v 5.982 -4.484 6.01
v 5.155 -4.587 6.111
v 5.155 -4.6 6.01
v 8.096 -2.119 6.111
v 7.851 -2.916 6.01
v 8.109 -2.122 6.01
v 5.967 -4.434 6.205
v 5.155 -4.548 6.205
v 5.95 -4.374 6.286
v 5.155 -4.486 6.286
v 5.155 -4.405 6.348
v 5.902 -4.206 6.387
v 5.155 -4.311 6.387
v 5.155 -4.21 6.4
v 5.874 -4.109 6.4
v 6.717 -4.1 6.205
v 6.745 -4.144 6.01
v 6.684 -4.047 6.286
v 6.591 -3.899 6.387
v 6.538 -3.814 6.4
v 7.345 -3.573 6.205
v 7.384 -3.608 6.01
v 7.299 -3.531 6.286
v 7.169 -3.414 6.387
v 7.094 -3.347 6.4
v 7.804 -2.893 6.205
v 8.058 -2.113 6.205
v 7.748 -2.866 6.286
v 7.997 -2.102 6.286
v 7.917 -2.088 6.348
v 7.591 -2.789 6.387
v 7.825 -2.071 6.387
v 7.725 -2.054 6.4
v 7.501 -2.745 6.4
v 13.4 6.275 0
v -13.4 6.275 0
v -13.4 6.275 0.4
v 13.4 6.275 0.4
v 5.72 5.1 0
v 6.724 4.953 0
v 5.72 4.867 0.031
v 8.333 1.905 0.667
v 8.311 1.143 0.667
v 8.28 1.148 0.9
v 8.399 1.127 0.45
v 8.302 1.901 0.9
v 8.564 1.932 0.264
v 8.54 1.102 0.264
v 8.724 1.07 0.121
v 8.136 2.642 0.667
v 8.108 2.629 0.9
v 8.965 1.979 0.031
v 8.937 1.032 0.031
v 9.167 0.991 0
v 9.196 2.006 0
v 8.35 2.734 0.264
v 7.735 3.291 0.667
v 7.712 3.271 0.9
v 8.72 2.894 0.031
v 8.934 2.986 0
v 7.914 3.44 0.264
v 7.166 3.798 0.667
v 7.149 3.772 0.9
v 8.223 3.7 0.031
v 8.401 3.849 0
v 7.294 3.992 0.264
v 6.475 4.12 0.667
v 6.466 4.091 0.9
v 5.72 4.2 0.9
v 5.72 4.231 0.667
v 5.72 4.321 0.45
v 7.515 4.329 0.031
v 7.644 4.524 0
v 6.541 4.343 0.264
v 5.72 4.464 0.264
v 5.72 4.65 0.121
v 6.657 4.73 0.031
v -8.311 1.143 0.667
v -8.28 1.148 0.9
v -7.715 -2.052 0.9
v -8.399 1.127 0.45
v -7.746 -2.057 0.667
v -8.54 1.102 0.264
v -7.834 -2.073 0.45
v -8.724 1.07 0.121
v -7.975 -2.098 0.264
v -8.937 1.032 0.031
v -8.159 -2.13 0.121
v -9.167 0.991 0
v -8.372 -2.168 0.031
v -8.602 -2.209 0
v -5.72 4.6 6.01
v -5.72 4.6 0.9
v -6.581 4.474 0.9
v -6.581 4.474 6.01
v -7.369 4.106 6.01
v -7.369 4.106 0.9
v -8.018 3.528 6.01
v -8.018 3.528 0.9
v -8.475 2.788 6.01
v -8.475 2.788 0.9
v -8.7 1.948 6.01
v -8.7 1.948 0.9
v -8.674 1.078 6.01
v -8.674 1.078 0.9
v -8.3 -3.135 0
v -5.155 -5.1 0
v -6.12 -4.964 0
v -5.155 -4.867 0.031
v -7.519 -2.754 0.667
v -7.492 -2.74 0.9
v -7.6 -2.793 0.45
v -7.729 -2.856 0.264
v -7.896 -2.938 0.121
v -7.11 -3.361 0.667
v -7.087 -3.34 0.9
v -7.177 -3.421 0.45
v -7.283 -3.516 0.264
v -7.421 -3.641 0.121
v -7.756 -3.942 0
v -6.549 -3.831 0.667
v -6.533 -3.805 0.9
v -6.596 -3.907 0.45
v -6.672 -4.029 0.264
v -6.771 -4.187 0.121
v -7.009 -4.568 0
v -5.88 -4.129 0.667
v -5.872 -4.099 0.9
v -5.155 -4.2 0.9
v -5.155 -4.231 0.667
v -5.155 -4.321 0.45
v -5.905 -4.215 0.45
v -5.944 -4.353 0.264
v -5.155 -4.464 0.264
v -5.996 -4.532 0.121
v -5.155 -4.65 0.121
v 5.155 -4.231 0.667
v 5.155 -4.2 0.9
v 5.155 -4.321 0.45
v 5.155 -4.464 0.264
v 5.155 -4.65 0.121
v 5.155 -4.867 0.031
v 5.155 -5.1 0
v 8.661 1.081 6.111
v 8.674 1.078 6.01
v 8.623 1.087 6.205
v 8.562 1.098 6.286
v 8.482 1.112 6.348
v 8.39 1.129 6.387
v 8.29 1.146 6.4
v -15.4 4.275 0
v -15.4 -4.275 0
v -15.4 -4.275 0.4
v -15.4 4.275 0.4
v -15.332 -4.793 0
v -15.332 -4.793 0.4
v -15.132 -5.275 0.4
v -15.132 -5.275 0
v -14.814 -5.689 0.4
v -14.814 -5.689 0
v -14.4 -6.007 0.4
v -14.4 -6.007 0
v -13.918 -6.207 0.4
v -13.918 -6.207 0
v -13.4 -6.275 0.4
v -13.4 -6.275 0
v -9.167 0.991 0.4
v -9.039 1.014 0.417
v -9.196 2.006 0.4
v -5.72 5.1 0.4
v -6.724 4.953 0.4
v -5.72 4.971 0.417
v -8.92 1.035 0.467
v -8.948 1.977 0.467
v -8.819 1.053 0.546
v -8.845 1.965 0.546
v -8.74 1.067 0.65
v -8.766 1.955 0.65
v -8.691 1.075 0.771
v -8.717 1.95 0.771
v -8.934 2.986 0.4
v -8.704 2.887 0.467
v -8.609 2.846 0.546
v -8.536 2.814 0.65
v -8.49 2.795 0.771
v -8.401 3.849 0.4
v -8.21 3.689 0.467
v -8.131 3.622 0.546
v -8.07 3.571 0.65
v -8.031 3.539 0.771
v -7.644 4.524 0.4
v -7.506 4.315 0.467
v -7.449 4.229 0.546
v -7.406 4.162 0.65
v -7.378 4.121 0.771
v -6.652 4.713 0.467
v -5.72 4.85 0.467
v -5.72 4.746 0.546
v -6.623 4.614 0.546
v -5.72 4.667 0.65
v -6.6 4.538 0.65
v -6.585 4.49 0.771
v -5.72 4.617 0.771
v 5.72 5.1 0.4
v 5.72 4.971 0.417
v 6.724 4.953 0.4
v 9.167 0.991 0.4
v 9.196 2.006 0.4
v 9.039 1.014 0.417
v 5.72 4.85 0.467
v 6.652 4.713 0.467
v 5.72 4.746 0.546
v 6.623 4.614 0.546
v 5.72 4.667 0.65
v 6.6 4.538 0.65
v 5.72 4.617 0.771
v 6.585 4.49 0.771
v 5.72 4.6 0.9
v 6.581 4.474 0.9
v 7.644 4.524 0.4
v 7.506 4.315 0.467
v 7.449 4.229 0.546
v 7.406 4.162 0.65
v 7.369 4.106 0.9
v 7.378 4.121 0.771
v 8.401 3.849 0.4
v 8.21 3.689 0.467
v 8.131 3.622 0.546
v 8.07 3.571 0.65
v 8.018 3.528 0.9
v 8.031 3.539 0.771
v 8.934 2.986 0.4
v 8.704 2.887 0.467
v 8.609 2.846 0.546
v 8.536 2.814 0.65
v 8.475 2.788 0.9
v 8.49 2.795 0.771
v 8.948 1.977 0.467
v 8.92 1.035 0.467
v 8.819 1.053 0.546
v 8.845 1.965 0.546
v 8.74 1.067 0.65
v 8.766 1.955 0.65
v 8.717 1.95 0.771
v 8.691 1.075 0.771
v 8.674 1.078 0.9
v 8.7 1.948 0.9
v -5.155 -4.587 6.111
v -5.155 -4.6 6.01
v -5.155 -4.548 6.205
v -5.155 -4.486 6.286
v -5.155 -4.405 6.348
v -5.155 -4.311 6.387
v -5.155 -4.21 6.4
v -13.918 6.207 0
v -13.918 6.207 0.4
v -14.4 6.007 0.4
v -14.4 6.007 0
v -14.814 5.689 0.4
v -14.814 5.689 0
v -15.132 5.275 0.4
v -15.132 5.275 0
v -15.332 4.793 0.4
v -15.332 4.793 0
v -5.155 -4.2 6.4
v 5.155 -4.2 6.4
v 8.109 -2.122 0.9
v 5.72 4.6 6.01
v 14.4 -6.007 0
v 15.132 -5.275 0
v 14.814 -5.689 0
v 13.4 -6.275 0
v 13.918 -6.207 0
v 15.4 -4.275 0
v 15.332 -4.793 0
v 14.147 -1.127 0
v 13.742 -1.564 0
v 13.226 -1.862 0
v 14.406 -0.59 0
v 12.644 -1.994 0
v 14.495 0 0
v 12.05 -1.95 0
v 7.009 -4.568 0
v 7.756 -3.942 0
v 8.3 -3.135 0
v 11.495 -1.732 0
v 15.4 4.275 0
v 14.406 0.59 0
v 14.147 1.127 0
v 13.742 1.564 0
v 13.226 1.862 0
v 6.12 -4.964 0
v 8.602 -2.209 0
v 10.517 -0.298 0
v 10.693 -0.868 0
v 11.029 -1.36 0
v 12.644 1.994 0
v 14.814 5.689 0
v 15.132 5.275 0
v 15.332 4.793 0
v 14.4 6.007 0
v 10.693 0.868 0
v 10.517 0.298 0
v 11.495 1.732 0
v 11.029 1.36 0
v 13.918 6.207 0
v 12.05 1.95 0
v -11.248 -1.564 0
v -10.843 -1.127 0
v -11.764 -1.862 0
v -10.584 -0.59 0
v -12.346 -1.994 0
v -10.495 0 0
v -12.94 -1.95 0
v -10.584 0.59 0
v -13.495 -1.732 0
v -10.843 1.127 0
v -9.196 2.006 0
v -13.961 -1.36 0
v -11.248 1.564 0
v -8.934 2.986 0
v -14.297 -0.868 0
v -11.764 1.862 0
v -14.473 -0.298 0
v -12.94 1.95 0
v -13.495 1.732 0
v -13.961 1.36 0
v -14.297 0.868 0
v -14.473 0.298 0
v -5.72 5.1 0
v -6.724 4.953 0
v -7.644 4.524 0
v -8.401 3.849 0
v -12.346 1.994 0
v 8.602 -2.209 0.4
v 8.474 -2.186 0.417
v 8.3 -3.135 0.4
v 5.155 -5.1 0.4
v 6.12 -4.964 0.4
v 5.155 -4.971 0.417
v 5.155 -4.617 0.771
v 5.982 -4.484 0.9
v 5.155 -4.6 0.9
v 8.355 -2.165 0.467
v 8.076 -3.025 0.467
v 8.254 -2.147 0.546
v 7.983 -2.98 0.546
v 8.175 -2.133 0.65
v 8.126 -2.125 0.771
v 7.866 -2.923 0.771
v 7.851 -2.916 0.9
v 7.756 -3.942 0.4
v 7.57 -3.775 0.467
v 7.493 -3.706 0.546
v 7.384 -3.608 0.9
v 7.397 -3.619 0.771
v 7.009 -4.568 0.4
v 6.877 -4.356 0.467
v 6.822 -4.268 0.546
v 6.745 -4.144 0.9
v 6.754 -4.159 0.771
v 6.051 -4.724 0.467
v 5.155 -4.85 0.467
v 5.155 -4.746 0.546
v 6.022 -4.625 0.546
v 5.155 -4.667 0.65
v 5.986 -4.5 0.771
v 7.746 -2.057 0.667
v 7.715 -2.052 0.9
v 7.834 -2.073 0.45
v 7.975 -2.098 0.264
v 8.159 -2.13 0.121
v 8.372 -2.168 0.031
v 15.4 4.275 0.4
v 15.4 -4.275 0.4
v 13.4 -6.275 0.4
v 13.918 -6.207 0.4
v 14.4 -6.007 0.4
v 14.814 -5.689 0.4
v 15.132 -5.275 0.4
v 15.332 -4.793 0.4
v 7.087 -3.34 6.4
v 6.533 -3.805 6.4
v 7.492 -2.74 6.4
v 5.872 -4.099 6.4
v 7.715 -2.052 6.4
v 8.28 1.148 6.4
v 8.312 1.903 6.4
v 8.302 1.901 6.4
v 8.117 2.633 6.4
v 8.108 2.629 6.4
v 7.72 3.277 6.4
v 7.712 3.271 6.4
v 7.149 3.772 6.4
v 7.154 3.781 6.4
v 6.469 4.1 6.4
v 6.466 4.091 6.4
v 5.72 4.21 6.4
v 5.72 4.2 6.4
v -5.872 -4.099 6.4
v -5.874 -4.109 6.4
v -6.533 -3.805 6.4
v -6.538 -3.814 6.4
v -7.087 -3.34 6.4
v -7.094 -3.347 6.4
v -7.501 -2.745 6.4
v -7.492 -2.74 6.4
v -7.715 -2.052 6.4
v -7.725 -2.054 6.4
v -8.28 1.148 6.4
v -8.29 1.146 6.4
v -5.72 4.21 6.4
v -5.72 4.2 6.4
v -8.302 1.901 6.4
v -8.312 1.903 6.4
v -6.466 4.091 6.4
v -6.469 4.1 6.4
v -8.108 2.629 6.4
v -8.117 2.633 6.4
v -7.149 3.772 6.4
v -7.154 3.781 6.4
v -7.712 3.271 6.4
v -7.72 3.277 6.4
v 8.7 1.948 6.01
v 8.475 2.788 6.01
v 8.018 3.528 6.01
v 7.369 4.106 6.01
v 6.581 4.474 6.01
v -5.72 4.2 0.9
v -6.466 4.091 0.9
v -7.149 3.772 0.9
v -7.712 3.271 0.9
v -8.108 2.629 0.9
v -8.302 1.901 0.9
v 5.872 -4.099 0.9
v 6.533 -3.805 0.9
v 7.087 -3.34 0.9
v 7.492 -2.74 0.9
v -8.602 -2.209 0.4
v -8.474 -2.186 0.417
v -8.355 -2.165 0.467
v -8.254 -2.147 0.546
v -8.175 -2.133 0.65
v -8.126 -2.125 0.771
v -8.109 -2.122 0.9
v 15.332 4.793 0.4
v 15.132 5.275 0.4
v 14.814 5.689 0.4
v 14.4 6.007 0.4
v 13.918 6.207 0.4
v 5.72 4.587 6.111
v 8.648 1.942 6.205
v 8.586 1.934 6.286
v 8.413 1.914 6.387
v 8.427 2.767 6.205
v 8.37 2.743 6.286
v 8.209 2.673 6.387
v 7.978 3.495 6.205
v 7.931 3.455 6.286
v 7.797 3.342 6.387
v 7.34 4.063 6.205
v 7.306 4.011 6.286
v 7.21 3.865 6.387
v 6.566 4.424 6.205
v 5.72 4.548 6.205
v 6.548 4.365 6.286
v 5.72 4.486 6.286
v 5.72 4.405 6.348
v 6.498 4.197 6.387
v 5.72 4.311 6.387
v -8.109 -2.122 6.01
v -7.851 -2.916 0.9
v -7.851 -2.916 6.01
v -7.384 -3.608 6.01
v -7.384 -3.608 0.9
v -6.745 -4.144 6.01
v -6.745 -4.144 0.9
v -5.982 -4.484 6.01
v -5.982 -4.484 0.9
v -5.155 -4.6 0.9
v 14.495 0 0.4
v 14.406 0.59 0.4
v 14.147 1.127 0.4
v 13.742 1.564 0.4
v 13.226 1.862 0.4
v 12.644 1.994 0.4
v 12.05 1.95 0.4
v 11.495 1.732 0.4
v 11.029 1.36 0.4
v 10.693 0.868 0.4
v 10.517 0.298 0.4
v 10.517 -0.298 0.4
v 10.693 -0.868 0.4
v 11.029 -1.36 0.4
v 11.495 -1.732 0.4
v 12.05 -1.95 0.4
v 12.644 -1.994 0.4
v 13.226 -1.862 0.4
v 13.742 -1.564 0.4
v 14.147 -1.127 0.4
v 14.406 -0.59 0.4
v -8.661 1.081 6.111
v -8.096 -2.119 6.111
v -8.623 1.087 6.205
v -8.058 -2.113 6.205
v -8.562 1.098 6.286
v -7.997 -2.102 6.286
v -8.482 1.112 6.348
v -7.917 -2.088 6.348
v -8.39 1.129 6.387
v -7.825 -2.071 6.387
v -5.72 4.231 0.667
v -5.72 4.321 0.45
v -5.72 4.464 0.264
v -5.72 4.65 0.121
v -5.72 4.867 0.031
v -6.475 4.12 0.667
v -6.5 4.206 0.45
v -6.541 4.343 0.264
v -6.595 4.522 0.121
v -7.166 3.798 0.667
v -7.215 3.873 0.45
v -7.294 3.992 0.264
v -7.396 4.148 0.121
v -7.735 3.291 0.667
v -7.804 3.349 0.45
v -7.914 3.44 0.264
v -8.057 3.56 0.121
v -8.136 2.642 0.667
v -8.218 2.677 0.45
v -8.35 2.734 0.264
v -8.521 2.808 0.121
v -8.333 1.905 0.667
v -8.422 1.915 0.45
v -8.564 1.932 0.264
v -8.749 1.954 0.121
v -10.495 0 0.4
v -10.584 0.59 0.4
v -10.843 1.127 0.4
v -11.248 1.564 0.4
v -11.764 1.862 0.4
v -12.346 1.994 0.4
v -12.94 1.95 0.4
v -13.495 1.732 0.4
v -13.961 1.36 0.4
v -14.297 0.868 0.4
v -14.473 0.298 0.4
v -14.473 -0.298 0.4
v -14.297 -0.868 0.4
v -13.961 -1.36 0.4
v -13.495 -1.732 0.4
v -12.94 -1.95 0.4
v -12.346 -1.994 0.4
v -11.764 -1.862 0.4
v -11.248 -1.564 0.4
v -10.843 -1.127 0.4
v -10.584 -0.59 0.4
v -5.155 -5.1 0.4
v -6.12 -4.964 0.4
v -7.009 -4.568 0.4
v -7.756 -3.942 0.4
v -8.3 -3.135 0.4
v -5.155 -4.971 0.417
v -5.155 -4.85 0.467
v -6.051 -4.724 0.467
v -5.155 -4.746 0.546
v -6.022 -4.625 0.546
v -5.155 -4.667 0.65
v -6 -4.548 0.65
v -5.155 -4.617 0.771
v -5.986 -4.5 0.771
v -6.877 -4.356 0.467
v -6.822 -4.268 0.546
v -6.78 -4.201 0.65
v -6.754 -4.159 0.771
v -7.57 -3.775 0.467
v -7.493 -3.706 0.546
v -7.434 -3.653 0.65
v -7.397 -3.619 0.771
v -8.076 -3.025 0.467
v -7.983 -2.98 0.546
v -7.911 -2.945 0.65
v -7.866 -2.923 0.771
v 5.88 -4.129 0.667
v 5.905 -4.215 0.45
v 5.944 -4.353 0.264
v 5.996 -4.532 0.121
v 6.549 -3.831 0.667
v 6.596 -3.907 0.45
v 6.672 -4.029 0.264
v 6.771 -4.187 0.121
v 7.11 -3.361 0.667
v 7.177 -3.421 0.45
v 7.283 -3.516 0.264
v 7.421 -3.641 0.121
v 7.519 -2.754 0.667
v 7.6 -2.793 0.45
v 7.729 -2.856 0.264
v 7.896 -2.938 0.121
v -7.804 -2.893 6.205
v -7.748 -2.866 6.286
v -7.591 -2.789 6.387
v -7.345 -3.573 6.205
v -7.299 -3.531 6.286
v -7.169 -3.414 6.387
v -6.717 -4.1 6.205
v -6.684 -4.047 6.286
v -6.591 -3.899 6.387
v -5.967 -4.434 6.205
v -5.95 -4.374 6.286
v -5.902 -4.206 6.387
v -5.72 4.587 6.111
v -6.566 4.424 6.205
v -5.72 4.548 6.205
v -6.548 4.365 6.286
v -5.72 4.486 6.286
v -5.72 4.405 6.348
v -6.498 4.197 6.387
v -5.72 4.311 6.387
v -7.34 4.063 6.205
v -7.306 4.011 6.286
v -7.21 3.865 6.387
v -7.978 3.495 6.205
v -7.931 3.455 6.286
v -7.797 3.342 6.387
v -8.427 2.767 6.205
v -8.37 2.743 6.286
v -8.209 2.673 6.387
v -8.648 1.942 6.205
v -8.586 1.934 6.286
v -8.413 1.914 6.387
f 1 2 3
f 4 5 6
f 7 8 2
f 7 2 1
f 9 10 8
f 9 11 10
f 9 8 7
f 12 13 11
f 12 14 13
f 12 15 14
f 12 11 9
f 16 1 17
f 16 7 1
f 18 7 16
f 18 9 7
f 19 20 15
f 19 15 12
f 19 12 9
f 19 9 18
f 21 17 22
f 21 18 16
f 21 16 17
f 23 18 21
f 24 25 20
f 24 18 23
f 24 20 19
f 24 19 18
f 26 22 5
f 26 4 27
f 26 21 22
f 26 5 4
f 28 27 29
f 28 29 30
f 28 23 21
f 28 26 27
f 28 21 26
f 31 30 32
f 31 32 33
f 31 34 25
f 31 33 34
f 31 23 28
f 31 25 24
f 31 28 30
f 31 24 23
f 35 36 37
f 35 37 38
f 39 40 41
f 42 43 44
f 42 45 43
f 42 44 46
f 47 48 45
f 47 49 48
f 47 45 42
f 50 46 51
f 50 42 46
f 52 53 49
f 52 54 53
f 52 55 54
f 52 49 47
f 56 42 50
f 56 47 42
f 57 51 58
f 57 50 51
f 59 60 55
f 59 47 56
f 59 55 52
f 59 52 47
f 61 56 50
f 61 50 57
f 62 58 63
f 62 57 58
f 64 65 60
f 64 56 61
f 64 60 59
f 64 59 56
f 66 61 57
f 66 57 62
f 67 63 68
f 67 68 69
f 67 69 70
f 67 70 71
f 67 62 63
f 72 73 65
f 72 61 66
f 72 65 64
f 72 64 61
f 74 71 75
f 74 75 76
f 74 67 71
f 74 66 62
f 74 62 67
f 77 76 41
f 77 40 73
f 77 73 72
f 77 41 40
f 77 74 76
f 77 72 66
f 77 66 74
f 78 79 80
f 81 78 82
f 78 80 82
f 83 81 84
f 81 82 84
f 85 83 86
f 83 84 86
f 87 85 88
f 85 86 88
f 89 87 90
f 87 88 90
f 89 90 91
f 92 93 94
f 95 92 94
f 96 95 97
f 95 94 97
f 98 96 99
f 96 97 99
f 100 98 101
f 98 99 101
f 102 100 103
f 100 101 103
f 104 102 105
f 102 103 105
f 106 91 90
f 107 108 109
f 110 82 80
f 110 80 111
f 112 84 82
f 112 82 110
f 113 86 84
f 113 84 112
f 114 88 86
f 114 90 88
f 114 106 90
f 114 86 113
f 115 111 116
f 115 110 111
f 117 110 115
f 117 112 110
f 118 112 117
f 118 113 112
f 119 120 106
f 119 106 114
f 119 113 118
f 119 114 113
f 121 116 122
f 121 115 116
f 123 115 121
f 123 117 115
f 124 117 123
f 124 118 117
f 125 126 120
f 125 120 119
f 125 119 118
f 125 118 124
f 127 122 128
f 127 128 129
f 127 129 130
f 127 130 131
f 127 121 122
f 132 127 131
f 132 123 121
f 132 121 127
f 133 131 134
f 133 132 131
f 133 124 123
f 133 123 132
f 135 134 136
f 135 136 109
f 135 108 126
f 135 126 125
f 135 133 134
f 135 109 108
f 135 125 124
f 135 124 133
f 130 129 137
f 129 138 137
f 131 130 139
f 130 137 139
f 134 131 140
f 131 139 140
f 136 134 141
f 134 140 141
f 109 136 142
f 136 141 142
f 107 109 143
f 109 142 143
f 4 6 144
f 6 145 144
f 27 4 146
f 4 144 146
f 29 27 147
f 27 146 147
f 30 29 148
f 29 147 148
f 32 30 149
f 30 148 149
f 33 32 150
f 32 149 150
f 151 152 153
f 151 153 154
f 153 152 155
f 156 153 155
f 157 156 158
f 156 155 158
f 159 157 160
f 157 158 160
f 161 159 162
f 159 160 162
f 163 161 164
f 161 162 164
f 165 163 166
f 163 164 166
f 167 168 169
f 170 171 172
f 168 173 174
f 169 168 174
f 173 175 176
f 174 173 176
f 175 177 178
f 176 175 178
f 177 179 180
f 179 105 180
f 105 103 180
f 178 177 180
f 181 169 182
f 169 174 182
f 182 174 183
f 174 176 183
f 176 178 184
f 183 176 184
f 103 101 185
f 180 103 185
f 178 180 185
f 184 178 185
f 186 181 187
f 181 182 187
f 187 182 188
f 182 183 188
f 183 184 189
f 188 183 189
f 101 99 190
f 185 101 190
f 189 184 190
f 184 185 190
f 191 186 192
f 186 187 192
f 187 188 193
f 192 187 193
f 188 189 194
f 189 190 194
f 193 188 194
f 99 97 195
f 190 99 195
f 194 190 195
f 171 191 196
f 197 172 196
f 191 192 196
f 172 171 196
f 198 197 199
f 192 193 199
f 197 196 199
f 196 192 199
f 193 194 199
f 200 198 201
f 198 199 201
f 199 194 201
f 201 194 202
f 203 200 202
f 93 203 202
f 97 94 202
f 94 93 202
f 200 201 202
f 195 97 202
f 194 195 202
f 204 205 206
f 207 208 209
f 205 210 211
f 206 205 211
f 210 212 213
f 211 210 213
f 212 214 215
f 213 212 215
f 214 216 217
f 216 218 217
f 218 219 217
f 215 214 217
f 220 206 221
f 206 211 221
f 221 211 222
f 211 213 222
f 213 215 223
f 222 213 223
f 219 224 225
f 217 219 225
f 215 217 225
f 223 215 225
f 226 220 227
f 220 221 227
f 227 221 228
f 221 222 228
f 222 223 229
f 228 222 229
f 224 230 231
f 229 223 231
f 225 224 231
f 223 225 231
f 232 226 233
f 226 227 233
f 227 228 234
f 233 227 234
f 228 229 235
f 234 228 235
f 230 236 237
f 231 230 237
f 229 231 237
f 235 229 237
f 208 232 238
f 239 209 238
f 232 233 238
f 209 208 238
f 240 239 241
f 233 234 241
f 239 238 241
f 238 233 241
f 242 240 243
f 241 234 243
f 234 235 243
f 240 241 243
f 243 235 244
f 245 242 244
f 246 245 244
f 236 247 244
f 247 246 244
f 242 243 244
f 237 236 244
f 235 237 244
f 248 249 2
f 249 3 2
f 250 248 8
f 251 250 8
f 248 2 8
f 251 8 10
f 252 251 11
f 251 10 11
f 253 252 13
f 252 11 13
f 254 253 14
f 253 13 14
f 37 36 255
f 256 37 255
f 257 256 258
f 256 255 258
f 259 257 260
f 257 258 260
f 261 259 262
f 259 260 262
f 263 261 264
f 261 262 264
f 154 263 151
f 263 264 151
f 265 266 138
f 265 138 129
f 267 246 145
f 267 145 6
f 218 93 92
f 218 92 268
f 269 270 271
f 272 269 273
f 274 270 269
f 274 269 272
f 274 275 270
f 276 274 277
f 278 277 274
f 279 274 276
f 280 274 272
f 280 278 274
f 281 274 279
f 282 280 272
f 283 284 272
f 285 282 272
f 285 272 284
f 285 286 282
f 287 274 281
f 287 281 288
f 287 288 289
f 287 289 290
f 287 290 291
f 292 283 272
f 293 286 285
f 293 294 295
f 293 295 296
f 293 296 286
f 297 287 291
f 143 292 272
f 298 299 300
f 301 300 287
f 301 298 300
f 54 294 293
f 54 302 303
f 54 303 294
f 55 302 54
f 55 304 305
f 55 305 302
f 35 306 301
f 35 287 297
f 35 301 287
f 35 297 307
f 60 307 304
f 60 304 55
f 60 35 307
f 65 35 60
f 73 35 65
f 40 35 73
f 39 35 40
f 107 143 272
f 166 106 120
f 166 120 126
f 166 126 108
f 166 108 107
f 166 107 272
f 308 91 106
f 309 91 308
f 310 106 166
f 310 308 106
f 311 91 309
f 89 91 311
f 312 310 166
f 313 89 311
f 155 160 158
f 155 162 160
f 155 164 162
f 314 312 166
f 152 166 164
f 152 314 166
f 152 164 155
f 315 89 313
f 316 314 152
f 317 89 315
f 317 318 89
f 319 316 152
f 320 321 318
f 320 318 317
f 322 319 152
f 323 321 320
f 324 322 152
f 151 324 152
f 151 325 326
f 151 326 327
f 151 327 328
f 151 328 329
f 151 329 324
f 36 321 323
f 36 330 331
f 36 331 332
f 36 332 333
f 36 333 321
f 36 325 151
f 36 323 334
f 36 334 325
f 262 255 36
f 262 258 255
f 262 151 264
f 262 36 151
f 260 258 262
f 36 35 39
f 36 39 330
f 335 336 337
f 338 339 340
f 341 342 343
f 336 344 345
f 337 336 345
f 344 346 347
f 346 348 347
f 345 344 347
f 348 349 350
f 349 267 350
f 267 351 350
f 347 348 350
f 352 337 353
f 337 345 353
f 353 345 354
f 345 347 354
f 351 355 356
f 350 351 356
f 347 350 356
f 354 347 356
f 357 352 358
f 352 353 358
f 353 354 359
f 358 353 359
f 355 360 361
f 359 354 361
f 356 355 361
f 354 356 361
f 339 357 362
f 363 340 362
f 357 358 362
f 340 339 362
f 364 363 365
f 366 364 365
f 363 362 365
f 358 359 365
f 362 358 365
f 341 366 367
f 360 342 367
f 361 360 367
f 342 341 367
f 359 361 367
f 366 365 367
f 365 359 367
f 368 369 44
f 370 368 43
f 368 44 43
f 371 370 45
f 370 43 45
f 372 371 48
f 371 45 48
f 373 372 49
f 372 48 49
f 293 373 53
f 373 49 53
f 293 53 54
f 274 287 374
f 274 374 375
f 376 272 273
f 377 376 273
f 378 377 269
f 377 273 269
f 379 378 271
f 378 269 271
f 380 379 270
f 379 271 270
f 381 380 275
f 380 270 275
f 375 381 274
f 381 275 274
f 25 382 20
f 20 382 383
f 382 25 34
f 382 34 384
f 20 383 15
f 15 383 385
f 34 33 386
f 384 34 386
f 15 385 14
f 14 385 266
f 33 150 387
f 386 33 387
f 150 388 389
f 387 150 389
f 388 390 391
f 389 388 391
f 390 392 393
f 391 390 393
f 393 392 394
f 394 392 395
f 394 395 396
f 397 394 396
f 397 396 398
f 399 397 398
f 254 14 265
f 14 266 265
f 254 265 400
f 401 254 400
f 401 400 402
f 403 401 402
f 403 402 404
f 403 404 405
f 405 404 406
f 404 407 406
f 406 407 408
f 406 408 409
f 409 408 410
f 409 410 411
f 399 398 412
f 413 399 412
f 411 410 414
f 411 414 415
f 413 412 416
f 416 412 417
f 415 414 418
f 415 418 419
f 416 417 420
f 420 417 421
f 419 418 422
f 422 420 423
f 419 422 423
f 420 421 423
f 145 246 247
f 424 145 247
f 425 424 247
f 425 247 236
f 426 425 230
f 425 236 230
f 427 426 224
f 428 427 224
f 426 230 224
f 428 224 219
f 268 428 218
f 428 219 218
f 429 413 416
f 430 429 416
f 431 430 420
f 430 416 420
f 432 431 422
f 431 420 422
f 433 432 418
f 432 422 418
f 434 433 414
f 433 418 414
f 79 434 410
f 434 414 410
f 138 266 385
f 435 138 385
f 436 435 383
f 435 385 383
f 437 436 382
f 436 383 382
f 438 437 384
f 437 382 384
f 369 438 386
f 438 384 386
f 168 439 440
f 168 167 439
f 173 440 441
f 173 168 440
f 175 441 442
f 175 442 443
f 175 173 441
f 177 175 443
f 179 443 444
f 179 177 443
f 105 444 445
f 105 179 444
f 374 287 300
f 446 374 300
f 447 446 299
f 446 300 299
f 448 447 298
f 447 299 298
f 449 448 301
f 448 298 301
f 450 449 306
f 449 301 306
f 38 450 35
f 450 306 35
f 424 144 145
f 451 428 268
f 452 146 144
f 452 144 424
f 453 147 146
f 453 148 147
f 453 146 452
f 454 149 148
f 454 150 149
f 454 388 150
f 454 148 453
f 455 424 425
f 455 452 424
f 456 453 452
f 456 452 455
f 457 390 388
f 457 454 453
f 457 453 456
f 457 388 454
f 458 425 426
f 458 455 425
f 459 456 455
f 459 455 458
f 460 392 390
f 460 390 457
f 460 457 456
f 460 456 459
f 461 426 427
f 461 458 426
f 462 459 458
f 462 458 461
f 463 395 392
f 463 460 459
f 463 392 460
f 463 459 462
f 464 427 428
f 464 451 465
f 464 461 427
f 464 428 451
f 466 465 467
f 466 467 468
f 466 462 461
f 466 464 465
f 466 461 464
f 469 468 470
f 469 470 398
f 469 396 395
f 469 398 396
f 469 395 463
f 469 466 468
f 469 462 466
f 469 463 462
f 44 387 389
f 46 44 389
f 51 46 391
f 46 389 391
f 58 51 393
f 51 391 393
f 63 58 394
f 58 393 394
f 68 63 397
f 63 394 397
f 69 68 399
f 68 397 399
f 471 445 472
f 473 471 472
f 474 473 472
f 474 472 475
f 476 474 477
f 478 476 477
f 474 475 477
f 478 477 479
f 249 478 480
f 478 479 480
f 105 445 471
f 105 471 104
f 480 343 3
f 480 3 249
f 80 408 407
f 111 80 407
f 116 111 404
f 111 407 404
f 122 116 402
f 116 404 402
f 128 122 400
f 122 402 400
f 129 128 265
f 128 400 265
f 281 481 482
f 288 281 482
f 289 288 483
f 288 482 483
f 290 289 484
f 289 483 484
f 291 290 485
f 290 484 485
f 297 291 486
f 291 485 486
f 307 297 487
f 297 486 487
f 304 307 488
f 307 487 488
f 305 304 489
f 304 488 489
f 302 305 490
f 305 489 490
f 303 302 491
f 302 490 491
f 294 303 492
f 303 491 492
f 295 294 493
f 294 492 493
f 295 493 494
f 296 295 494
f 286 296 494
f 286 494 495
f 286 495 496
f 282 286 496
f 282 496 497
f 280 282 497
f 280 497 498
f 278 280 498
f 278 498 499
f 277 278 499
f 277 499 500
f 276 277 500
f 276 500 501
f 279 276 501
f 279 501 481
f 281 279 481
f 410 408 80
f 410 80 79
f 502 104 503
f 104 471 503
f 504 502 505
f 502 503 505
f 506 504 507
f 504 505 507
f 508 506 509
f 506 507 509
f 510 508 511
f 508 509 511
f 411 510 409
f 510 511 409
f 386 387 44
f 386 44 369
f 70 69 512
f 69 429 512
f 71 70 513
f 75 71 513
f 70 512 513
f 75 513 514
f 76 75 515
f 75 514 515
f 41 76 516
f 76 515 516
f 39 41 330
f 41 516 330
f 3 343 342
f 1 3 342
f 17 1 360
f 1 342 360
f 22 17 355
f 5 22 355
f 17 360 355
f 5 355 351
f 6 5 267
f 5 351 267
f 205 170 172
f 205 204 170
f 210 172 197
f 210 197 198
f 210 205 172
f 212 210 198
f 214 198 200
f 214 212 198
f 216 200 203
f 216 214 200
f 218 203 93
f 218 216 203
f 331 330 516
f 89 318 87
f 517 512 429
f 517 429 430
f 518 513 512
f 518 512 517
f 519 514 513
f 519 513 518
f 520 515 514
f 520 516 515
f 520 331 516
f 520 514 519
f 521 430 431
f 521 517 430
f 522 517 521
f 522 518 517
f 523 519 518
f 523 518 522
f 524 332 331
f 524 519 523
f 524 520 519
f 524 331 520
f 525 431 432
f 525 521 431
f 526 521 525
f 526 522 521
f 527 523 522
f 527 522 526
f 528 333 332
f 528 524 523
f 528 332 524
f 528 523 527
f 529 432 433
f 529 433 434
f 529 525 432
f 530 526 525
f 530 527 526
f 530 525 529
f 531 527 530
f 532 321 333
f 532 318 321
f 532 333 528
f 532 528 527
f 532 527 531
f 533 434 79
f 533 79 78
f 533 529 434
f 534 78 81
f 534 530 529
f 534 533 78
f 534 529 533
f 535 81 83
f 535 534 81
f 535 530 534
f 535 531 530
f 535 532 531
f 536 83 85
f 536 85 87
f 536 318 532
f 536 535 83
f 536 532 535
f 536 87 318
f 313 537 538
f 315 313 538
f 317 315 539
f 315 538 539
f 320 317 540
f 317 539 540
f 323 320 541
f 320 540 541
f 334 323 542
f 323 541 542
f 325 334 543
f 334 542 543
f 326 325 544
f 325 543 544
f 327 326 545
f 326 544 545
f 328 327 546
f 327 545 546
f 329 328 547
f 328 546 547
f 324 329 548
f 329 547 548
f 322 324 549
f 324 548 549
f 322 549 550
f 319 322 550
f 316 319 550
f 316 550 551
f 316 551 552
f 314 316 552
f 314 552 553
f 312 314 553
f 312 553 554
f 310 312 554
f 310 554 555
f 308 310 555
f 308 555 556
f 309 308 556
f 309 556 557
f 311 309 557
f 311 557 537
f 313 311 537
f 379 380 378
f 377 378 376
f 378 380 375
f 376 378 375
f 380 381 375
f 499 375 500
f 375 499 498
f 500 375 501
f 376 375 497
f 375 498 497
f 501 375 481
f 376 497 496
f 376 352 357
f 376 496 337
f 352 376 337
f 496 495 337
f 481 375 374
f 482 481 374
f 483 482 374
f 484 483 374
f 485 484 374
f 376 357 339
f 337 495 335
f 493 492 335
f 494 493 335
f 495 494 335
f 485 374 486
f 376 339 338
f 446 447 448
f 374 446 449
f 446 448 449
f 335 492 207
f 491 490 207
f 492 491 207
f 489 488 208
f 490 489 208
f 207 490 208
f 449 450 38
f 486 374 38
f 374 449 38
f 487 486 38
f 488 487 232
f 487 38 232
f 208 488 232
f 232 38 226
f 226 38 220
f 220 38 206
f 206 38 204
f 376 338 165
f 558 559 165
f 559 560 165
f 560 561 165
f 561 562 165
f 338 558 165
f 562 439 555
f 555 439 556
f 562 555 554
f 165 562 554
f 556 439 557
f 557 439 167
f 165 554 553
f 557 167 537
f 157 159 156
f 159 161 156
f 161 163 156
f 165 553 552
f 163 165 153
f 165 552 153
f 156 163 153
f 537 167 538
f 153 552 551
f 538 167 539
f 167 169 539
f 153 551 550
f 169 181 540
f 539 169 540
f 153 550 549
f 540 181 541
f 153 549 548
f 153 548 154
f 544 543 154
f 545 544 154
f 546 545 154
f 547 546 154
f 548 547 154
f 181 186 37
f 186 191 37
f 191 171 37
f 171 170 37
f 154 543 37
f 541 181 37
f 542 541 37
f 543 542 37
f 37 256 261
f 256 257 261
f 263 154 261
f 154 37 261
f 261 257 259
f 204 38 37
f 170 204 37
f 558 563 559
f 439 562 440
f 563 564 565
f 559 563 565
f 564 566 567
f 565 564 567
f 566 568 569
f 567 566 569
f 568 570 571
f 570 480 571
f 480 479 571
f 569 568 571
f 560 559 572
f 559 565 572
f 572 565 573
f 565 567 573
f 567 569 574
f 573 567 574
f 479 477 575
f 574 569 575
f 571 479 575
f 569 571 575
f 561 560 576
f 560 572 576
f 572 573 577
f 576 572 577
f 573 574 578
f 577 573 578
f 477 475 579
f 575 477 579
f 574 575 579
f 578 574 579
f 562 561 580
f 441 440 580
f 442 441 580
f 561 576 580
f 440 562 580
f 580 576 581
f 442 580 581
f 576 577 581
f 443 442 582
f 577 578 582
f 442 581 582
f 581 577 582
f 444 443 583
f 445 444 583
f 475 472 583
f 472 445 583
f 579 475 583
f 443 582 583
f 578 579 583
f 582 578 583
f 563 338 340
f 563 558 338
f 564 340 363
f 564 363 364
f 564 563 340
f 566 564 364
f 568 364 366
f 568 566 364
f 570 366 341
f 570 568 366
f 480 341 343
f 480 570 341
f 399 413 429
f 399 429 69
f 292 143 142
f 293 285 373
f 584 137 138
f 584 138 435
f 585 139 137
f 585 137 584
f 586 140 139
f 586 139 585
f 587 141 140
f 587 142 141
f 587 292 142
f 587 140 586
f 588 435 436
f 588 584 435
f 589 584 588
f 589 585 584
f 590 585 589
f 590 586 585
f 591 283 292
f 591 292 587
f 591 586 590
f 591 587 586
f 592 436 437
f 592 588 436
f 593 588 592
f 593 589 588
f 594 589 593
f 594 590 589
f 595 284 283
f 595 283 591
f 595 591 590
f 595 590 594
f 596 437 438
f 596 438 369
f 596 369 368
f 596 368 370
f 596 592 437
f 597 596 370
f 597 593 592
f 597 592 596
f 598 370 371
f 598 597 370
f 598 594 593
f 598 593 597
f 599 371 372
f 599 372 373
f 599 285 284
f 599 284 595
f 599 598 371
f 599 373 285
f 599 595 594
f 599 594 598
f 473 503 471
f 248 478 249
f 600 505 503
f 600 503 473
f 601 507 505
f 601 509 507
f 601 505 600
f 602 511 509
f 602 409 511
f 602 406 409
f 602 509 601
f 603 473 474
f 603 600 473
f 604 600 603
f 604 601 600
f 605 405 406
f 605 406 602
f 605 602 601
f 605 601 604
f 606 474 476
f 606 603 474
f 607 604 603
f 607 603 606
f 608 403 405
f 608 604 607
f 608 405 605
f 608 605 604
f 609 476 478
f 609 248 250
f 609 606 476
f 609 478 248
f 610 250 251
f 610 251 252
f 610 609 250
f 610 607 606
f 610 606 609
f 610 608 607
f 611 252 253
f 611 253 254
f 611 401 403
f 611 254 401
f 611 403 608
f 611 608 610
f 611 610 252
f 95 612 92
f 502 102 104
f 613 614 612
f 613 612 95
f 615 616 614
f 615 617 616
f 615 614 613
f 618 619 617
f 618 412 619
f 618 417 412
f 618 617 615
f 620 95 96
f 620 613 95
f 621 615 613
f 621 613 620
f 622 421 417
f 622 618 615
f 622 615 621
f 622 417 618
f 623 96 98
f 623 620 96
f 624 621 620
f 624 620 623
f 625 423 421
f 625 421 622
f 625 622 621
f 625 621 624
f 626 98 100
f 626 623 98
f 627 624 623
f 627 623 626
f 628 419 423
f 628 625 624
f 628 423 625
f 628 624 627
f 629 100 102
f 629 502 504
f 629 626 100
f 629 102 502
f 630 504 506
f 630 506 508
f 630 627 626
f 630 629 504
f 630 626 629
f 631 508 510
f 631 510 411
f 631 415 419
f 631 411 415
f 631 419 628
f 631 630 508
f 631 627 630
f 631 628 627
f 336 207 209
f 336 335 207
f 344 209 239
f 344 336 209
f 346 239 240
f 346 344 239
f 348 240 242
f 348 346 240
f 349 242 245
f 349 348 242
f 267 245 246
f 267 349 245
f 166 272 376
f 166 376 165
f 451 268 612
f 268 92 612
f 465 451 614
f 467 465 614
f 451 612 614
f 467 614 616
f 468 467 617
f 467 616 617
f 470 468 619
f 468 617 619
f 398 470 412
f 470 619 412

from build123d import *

# Parameters (mm, degrees)
PAD_DEPTH       = 0.4
SKETCH001_R     = 2
POCKET_DEPTH    = 5
PAD001_DEPTH    = 6
POCKET001_DEPTH = 6.401
FILLET_R        = 0.5
FILLET001_R     = 0.39
FILLET002_R     = 0.9


with BuildPart() as part:
    # Sketch → Pad (new body)
    with BuildSketch(Plane.XY):
        with BuildLine():
            Line((-13.4, 6.275), (13.4, 6.275))
            ThreePointArc((15.4, 4.275), (14.814214, 5.689214), (13.4, 6.275))
            Line((15.4, 4.275), (15.4, -4.275))
            ThreePointArc((13.4, -6.275), (14.814214, -5.689214), (15.4, -4.275))
            Line((13.4, -6.275), (-13.4, -6.275))
            ThreePointArc((-15.4, -4.275), (-14.814214, -5.689214), (-13.4, -6.275))
            Line((-15.4, -4.275), (-15.4, 4.275))
            ThreePointArc((-13.4, 6.275), (-14.814214, 5.689214), (-15.4, 4.275))
        make_face()
    extrude(amount=PAD_DEPTH)

    # Sketch001 (on Face10 of Pad) → Pocket (cut)
    with BuildSketch(Plane.XY.offset(0.4)):
        with Locations((-12.495, 0)):
            Circle(SKETCH001_R)
        with Locations((12.495, 0)):
            Circle(SKETCH001_R)
    extrude(amount=-POCKET_DEPTH, mode=Mode.SUBTRACT)

    # Sketch002 (on Face5 of Pocket) → Pad001 (join)
    with BuildSketch(Plane.XY.offset(0.4)):
        with BuildLine():
            Line((-5.72, 4.6), (5.72, 4.6))
            ThreePointArc((8.674304, 1.078381), (8.018354, 3.5281), (5.72, 4.6))
            Line((8.674304, 1.078381), (8.109304, -2.121619))
            ThreePointArc((5.155, -4.6), (7.0831, -3.898354), (8.109304, -2.121619))
            Line((5.155, -4.6), (-5.155, -4.6))
            ThreePointArc((-8.109304, -2.121619), (-7.0831, -3.898354), (-5.155, -4.6))
            Line((-8.109304, -2.121619), (-8.674304, 1.078381))
            ThreePointArc((-5.72, 4.6), (-8.018354, 3.5281), (-8.674304, 1.078381))
        make_face()
    extrude(amount=PAD001_DEPTH)

    # Sketch003 (on Face21 of Pad001) → Pocket001 (cut, through all)
    with BuildSketch(Plane.XY.offset(6.4)):
        with BuildLine():
            Line((-5.72, 4.2), (5.72, 4.2))
            ThreePointArc((8.280397, 1.14793), (7.711906, 3.27102), (5.72, 4.2))
            Line((8.280397, 1.14793), (7.715397, -2.05207))
            ThreePointArc((5.155, -4.2), (6.82602, -3.591906), (7.715397, -2.05207))
            Line((5.155, -4.2), (-5.155, -4.2))
            ThreePointArc((-7.715397, -2.05207), (-6.82602, -3.591906), (-5.155, -4.2))
            Line((-7.715397, -2.05207), (-8.280397, 1.14793))
            ThreePointArc((-5.72, 4.2), (-7.711906, 3.27102), (-8.280397, 1.14793))
        make_face()
    extrude(amount=-POCKET001_DEPTH, mode=Mode.SUBTRACT)

    # Fillet
    fillet_edges = [part.edges().sort_by_distance(p)[0] for p in [
        (0, -4.6, 0.4),
    ]]
    fillet(fillet_edges, radius=FILLET_R)

    # Fillet001
    fillet001_edges = [part.edges().sort_by_distance(p)[0] for p in [
        (-7.0831, -3.898354, 6.4),
    ]]
    fillet(fillet001_edges, radius=FILLET001_R)

    # Fillet002
    fillet002_edges = [part.edges().sort_by_distance(p)[0] for p in [
        (0, 4.2, 0),
    ]]
    fillet(fillet002_edges, radius=FILLET002_R)


solid = part.part
